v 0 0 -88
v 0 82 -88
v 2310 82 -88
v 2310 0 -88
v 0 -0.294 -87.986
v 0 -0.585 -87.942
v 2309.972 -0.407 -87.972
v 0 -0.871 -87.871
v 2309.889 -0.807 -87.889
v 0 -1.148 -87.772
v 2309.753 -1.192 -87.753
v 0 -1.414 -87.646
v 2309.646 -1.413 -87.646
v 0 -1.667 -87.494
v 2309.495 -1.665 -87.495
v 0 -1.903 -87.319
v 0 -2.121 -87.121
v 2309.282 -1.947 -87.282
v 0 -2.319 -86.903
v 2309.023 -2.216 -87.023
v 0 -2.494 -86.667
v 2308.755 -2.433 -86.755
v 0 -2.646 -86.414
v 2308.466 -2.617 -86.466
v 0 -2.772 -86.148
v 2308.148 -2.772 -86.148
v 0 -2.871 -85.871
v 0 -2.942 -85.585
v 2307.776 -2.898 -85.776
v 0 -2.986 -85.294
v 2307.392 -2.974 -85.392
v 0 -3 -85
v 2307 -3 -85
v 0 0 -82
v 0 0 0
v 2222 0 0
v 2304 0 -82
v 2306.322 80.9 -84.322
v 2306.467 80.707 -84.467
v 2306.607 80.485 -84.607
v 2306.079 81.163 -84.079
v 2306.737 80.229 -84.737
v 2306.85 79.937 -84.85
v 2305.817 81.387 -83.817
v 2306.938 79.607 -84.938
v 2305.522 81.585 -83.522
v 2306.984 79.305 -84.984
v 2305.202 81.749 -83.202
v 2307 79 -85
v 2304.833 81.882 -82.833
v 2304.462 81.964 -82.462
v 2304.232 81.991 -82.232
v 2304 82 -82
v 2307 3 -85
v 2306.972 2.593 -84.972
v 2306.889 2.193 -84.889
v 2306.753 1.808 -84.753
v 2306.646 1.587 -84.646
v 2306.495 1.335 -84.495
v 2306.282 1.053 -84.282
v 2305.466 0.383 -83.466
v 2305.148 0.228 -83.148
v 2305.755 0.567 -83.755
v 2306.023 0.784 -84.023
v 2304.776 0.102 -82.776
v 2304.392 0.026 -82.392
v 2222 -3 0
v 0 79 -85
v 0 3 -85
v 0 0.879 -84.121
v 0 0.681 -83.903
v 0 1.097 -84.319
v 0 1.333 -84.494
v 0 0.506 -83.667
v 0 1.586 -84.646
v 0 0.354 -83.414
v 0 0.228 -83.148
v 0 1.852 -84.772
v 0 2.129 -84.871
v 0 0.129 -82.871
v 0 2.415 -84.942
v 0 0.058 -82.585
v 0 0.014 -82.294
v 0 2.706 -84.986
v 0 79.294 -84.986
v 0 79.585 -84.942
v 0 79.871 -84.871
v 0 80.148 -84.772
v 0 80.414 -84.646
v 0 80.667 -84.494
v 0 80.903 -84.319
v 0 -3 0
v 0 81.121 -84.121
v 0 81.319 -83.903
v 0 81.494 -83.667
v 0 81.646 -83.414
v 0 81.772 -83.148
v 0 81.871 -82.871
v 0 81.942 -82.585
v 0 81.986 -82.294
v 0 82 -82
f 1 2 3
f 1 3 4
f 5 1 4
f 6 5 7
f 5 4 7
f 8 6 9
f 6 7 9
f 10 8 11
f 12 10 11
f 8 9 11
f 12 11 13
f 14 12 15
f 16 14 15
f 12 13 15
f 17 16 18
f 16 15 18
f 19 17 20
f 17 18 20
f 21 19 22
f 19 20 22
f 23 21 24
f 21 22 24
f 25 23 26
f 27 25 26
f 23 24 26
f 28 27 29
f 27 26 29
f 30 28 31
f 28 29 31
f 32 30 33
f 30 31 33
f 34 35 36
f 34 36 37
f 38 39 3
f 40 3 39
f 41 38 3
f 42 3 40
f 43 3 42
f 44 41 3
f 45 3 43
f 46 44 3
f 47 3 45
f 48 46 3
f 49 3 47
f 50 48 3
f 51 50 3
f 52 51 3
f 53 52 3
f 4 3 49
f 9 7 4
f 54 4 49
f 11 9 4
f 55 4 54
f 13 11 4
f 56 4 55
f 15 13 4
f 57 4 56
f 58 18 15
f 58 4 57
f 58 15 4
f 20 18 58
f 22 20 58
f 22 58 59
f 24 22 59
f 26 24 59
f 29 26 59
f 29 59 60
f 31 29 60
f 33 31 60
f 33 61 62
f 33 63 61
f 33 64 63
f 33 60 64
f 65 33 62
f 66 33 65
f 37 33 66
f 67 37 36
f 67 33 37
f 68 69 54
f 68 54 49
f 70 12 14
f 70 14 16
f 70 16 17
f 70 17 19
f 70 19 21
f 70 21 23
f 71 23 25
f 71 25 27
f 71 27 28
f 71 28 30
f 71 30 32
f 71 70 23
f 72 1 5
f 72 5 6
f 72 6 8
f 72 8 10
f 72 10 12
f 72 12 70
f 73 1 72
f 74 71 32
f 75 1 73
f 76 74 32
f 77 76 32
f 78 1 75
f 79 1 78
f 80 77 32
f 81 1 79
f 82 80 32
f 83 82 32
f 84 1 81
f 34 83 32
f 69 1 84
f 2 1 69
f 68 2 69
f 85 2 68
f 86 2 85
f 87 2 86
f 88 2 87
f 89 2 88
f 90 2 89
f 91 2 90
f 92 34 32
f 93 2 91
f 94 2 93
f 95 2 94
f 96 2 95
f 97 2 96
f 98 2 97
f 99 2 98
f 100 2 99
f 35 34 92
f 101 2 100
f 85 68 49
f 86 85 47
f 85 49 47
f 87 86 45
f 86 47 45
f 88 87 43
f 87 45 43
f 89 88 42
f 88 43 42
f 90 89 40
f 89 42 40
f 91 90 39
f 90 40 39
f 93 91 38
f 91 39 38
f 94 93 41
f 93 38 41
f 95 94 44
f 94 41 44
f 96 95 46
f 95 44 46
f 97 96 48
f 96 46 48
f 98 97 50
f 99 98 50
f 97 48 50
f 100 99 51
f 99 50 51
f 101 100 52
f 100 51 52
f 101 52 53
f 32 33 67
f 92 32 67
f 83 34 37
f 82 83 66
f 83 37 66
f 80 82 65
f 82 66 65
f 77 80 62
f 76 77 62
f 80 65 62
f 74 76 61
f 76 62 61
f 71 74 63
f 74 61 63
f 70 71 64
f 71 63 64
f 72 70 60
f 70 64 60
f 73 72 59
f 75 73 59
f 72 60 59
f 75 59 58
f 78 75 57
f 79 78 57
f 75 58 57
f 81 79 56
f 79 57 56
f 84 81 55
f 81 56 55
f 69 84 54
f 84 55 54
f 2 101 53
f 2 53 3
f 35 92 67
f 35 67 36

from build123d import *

# Parameters (mm, degrees)
BOSS_EXTRUDE1_DEPTH     = 2310
FILLET1_R               = 3
CUT_EXTRUDE1_DEPTH      = 85
CUT_EXTRUDE1_DEPTH_BACK = 2315.387175906
SKETCH6_W               = 2310
SKETCH6_H               = 30
CUT_EXTRUDE2_DEPTH      = 41


with BuildPart() as part:
    # Sketch1 → Boss-Extrude1 (new body)
    with BuildSketch(Plane(origin=(0, 0, 0), x_dir=(0, 0, -1), z_dir=(1, 0, 0))):
        Polygon((0, 0), (85, 0), (85, 82), (47, 82), (47, 112), (50, 112), (50, 85), (88, 85), (88, -3), (0, -3), align=None)
    extrude(amount=BOSS_EXTRUDE1_DEPTH)

    # Fillet1
    fillet1_edges = [part.edges().sort_by_distance(p)[0] for p in [
        (1155, 0, -85),
        (1155, 82, -85),
        (1155, 82, -47),
        (1155, 85, -50),
        (1155, 85, -88),
        (1155, -3, -88),
    ]]
    fillet(fillet1_edges, radius=FILLET1_R)

    # Sketch3 → Cut-Extrude1 (cut, two sides: drawn at the far end of the back side and taken through both)
    with BuildSketch(Plane(origin=(0, 0, 0), x_dir=(1, 0, 0), z_dir=(0, 1, 0)).offset(-CUT_EXTRUDE1_DEPTH_BACK)):
        Polygon((2310, 88), (2222, 0), (2310, 0), align=None)
    extrude(amount=CUT_EXTRUDE1_DEPTH + CUT_EXTRUDE1_DEPTH_BACK, mode=Mode.SUBTRACT)

    # Sketch6 → Cut-Extrude2 (cut)
    with BuildSketch(Plane.XY.offset(-47)):
        with Locations((1155, 97)):
            Rectangle(SKETCH6_W, SKETCH6_H)
    extrude(amount=-CUT_EXTRUDE2_DEPTH, mode=Mode.SUBTRACT)


solid = part.part
